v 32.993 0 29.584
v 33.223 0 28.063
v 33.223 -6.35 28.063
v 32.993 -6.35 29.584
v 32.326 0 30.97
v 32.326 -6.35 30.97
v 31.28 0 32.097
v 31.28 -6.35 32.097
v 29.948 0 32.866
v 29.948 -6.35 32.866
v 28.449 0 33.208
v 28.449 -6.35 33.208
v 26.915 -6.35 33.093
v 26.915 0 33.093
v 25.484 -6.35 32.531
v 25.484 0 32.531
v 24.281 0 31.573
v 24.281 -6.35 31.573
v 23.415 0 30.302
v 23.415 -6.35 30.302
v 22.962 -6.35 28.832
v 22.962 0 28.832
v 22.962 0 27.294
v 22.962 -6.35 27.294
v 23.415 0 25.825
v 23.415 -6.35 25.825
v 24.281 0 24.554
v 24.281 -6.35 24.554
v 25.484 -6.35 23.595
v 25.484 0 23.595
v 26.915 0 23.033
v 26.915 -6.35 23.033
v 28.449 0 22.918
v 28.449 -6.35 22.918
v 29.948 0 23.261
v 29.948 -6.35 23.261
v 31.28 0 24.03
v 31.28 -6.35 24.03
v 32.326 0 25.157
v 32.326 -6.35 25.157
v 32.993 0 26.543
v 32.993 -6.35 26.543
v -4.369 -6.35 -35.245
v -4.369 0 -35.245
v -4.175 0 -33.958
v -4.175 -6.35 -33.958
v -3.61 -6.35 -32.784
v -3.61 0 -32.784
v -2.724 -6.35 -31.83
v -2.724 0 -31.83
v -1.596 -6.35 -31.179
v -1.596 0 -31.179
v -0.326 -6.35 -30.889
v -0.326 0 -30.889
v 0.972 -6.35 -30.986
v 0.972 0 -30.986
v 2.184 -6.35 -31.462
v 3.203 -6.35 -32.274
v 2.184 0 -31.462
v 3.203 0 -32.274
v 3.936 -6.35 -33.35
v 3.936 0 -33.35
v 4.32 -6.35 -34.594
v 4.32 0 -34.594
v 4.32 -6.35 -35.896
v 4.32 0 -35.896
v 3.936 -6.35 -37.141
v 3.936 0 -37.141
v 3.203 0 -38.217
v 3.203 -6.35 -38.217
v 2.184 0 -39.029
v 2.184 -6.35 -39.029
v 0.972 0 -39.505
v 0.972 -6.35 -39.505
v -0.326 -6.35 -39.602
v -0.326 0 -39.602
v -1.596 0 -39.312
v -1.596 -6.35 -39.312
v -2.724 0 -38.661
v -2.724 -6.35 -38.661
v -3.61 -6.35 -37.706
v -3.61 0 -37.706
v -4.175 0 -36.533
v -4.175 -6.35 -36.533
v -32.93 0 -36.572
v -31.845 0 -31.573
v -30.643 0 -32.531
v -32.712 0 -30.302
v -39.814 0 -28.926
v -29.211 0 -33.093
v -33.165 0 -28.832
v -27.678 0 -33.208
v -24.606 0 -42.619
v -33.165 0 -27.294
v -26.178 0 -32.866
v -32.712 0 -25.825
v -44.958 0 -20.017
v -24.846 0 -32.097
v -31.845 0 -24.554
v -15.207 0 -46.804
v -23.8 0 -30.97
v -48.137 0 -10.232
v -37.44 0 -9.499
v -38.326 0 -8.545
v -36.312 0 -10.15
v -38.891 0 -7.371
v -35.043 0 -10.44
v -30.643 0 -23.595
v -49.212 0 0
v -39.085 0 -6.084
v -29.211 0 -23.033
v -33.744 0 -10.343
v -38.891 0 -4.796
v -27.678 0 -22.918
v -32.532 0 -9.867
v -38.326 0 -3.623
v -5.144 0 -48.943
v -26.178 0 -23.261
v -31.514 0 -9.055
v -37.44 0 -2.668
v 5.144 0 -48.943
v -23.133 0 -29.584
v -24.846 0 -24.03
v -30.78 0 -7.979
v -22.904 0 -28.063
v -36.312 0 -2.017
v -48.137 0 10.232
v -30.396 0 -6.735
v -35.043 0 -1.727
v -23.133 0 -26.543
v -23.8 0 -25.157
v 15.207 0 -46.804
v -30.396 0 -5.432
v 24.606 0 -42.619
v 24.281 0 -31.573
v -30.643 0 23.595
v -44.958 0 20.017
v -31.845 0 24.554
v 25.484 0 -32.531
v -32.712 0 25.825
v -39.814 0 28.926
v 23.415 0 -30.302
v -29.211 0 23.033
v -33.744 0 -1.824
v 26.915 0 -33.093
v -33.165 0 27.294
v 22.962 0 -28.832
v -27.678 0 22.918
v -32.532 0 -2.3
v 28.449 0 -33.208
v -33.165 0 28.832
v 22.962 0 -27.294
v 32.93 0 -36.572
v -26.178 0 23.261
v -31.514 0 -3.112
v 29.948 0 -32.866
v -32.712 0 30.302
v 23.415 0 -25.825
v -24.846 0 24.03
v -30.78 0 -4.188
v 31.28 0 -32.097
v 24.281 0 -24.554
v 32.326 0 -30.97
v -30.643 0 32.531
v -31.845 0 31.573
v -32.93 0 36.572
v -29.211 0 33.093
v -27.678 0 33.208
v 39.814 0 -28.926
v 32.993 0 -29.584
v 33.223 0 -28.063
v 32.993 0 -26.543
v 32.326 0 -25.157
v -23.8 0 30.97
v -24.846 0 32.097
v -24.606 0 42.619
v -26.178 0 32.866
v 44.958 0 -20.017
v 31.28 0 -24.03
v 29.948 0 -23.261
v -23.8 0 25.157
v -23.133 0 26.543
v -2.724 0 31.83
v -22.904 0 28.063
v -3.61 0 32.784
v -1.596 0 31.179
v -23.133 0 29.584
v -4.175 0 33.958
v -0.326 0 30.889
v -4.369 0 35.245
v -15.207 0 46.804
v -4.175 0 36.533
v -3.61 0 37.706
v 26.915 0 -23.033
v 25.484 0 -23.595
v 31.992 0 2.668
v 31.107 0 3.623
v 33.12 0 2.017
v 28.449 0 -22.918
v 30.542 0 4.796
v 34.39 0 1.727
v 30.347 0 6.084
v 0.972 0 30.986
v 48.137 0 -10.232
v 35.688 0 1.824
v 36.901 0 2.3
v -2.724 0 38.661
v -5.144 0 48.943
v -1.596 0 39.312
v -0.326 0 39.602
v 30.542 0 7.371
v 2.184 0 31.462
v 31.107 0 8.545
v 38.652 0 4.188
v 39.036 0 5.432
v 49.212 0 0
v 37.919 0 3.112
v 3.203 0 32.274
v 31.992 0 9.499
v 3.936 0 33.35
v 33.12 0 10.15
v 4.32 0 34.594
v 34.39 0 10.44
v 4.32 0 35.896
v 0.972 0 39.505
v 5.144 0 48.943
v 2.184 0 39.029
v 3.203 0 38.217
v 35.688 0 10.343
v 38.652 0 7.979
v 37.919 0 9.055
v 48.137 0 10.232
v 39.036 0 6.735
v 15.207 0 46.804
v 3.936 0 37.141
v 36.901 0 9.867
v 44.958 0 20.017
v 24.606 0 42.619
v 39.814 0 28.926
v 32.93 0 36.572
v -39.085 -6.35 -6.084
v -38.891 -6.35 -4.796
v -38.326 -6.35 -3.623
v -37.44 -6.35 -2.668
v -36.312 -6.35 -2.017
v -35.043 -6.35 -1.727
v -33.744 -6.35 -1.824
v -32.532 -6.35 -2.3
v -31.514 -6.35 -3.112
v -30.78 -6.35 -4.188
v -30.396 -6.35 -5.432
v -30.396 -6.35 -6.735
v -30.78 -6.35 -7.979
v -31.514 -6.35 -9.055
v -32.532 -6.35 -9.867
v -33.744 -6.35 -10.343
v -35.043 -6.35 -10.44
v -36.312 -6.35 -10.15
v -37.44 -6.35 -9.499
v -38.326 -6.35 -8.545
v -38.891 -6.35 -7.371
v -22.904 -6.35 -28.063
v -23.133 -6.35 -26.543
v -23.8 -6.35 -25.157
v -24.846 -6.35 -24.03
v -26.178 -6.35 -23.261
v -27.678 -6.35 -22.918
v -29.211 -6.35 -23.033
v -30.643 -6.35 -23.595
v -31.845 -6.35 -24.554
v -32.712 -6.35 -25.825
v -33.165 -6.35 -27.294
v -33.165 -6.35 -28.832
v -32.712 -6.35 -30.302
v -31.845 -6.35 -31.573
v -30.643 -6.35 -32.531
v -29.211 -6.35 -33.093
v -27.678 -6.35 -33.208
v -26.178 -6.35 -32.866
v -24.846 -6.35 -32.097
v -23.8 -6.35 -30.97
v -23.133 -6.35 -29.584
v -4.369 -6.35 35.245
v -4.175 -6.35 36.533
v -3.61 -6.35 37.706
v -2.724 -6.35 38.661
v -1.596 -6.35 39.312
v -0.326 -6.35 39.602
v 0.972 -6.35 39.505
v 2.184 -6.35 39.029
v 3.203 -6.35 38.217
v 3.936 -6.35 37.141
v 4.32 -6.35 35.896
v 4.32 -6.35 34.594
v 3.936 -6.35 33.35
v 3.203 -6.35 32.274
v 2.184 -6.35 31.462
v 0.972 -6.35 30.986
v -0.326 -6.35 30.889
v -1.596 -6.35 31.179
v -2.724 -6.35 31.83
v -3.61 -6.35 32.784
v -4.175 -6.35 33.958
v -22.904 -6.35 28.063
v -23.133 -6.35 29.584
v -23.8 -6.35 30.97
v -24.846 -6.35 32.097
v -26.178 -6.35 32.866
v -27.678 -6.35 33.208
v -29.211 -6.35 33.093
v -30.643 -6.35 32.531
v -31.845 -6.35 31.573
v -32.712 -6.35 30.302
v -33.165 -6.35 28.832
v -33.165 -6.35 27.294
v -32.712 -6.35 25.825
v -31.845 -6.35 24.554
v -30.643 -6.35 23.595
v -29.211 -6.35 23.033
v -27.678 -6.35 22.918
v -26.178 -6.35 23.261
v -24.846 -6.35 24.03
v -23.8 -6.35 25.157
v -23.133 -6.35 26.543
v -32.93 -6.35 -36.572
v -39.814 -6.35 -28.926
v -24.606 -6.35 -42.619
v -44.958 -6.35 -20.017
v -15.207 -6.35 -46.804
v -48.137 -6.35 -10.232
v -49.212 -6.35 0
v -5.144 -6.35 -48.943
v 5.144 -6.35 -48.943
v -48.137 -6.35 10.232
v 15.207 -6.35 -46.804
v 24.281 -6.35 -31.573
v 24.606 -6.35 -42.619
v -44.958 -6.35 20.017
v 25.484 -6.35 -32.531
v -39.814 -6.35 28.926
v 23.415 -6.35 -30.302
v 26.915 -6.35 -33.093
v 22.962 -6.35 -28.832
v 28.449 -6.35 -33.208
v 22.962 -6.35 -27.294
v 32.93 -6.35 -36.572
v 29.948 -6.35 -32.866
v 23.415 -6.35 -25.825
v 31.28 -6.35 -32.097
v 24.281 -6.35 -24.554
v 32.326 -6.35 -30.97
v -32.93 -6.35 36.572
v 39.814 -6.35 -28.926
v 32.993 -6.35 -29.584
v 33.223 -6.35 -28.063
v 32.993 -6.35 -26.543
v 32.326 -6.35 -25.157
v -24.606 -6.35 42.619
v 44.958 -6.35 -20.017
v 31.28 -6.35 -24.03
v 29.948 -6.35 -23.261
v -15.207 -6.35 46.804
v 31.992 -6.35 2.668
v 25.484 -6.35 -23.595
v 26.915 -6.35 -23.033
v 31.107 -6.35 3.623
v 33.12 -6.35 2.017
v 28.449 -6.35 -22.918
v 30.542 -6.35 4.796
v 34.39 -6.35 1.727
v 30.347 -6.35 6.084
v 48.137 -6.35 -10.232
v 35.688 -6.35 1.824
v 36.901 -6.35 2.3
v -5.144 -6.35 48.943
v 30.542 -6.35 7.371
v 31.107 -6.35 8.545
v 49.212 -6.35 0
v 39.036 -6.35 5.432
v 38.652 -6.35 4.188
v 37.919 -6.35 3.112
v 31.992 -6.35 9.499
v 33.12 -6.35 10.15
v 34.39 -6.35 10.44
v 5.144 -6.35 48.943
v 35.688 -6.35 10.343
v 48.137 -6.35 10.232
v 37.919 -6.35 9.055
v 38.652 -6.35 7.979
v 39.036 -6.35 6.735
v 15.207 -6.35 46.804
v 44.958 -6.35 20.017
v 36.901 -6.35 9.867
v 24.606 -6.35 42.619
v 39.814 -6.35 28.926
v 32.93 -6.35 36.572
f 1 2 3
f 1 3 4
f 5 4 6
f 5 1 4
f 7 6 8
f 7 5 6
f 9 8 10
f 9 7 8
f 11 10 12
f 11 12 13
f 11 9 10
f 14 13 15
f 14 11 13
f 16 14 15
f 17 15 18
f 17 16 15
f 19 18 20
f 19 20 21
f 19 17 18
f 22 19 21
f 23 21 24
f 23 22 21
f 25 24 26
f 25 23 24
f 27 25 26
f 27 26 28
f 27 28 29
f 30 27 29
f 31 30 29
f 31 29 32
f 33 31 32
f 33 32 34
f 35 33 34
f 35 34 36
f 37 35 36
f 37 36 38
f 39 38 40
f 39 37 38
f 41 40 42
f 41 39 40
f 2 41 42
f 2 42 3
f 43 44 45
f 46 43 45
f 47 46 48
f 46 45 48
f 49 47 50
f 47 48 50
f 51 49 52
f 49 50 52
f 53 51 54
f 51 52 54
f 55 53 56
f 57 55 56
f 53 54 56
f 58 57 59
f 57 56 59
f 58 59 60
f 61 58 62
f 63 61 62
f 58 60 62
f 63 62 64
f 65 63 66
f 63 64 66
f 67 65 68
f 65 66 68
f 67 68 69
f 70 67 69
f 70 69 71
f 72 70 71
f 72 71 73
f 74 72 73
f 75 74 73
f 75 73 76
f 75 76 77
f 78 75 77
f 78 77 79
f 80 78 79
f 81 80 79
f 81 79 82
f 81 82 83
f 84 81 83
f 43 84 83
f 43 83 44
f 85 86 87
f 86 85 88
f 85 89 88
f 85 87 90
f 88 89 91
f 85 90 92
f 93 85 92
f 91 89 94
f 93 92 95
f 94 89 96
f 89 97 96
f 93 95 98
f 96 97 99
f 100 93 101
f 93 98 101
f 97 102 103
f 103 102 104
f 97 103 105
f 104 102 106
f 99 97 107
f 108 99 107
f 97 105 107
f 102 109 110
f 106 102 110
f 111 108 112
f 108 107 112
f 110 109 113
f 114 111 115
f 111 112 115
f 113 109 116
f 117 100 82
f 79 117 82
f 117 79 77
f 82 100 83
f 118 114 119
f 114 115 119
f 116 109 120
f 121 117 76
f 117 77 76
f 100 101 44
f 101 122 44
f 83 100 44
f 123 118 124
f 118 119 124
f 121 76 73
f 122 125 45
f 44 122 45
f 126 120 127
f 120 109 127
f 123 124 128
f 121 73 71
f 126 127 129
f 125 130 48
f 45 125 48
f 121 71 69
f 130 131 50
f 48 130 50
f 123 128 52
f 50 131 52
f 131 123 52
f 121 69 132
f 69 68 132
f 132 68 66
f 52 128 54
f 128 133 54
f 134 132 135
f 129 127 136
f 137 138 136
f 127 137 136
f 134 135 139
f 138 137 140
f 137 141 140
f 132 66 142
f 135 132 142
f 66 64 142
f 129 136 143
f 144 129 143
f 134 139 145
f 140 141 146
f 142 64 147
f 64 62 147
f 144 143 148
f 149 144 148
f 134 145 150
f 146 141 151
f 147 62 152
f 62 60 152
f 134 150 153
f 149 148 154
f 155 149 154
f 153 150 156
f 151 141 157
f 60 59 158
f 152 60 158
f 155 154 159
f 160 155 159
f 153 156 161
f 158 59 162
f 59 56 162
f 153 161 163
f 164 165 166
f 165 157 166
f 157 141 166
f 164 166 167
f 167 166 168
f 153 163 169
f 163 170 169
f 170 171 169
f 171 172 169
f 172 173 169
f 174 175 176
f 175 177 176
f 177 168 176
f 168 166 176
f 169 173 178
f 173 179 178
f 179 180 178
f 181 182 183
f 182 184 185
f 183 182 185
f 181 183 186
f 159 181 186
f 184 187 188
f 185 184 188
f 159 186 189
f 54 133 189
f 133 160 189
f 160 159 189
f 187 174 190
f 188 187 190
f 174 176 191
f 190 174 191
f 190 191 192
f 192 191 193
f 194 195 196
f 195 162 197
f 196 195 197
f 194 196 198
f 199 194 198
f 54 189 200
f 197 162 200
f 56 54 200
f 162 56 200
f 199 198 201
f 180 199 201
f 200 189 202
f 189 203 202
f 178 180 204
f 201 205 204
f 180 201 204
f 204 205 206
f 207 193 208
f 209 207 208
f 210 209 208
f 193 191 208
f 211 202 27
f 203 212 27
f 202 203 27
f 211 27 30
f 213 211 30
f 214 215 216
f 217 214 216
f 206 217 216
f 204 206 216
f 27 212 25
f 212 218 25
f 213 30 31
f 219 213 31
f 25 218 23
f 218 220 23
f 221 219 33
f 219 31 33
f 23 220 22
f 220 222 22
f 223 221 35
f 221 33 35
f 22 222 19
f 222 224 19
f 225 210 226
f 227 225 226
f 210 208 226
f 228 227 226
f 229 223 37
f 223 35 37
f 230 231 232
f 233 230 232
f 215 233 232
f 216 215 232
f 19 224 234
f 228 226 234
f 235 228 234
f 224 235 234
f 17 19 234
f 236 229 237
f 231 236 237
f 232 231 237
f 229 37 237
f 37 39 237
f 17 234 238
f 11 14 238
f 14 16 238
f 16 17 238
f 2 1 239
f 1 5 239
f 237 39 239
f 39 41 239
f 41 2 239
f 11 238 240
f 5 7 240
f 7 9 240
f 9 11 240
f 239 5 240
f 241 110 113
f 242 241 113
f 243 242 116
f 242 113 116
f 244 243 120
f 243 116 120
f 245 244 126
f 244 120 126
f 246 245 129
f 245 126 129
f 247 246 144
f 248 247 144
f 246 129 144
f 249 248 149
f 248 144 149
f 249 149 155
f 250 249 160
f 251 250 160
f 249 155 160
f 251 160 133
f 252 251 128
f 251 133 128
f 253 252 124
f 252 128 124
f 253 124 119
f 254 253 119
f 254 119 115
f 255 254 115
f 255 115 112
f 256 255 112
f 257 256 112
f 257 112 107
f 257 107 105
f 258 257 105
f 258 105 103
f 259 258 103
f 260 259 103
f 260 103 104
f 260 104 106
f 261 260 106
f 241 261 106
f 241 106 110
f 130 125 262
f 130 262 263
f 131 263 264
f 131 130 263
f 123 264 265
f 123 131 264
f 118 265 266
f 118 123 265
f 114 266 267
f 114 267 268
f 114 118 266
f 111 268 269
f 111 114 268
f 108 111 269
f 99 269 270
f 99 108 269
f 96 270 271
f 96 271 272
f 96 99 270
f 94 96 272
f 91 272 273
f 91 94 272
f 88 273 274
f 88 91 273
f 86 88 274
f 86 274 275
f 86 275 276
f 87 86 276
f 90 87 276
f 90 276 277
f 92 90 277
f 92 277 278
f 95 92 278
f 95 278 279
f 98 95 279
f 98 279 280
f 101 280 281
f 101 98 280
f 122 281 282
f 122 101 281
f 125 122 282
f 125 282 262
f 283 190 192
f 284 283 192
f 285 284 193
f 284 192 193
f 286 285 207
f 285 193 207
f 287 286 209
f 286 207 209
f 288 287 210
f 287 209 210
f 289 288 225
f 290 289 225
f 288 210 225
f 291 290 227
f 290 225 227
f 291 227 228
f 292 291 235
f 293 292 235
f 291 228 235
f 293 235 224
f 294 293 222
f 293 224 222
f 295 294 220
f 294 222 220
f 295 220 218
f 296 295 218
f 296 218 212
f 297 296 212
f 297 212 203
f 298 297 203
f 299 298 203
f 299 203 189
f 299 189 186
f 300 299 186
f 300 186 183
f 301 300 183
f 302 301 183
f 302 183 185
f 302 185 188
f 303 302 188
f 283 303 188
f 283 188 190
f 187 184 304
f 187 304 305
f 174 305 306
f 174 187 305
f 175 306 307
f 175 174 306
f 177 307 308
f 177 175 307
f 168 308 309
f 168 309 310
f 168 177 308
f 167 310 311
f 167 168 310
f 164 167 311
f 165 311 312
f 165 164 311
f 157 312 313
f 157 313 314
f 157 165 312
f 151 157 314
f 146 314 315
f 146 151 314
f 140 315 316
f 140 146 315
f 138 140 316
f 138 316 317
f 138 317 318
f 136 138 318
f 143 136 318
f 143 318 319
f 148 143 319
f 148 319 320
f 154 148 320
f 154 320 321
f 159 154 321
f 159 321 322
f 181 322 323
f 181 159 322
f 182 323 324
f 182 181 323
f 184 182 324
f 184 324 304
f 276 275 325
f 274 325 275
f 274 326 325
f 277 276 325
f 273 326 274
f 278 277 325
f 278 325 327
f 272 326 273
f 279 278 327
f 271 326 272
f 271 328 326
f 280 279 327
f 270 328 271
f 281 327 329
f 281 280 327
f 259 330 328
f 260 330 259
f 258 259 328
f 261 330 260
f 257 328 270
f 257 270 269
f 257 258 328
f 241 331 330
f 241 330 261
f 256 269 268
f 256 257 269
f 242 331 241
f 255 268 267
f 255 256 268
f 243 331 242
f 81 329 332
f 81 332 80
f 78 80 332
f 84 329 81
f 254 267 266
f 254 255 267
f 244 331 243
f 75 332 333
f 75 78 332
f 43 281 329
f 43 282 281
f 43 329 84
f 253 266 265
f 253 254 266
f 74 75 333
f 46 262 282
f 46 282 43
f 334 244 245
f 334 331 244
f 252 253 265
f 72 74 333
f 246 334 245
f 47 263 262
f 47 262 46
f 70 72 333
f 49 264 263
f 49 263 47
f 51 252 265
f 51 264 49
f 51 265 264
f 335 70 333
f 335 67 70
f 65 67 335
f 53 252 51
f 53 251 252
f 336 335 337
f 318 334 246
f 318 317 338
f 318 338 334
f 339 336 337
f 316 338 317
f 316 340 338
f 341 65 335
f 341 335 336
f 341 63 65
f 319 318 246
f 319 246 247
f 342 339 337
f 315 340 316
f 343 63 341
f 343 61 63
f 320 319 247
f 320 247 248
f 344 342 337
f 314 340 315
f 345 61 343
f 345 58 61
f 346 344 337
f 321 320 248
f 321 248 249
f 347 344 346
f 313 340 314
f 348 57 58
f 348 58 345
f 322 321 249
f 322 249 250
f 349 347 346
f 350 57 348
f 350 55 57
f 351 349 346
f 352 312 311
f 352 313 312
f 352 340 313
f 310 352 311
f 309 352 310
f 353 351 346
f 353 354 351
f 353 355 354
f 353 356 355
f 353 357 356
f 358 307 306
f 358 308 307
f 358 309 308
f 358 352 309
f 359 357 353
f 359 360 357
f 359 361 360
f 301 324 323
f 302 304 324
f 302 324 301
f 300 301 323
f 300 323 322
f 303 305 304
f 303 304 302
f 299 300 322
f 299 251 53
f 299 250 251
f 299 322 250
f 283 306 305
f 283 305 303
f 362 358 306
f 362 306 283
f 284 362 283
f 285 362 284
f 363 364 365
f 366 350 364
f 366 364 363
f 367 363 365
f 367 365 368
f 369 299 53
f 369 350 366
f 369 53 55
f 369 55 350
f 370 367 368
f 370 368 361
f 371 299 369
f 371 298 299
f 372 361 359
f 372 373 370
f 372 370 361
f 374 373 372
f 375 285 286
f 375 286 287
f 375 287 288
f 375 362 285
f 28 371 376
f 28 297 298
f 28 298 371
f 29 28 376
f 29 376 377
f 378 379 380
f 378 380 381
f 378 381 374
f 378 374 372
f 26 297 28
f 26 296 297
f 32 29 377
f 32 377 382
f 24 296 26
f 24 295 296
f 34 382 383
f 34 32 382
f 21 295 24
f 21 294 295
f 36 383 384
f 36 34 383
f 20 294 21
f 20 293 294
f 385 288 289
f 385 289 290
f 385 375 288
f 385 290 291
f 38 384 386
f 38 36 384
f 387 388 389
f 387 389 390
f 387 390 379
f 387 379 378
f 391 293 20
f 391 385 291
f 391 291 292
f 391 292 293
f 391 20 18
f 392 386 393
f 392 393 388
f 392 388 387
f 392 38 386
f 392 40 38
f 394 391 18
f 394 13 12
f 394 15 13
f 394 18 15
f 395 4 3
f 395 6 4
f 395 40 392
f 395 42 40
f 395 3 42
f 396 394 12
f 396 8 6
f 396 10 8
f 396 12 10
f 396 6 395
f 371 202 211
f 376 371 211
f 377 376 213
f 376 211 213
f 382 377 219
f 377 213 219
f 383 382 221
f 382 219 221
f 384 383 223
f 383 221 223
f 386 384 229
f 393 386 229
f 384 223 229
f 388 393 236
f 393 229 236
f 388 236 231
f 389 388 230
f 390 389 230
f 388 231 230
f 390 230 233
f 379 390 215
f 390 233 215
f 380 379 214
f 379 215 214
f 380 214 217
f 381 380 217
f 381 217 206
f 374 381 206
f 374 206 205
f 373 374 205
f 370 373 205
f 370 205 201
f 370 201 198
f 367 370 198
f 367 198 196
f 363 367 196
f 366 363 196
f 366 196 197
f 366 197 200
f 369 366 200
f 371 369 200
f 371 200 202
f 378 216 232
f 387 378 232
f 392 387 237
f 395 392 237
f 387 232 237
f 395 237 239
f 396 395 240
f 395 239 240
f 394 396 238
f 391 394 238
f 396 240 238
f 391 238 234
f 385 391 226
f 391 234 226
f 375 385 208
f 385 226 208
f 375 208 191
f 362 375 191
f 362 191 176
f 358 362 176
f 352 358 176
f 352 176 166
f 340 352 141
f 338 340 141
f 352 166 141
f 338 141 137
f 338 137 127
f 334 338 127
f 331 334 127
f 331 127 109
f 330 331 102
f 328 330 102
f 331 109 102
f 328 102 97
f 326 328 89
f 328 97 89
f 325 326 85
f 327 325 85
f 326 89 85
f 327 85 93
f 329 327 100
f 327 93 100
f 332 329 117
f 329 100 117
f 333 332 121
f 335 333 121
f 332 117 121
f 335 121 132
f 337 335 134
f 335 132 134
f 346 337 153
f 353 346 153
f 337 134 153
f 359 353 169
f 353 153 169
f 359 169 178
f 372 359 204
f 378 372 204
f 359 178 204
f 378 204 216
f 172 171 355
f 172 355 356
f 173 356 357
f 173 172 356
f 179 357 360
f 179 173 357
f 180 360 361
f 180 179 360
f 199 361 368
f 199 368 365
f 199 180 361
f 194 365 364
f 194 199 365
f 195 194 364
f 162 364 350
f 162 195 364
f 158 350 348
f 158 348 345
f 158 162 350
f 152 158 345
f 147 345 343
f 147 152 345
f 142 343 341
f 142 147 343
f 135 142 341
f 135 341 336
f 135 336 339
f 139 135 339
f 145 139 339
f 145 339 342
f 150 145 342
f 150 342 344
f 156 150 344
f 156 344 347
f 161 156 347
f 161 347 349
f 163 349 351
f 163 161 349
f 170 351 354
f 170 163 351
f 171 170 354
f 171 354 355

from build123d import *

# Parameters (mm, degrees)
F0_R     = 49.2125
F0_R_2   = 5.159375
F1_DEPTH = 6.35
F3_D     = 8.7376


with BuildPart() as f1:
    # F0 (on Front) → F1 (new body)
    with BuildSketch(Plane.XZ):
        Circle(F0_R)
        with Locations((-28.0633, -28.0633)):
            Circle(F0_R_2, mode=Mode.SUBTRACT)
        with Locations((28.0633, -28.0633)):
            Circle(F0_R_2, mode=Mode.SUBTRACT)
        with Locations((-28.0633, 28.0633)):
            Circle(F0_R_2, mode=Mode.SUBTRACT)
        with Locations((28.0633, 28.0633)):
            Circle(F0_R_2, mode=Mode.SUBTRACT)
    extrude(amount=F1_DEPTH)

    # F3 (through all)
    with Locations(Plane.XZ.offset(6.35)):
        with Locations((0, 35.245303), (34.716293, 6.083617), (0, -35.245303), (-34.716293, -6.083617)):
            Hole(F3_D / 2)


solid = f1.part
